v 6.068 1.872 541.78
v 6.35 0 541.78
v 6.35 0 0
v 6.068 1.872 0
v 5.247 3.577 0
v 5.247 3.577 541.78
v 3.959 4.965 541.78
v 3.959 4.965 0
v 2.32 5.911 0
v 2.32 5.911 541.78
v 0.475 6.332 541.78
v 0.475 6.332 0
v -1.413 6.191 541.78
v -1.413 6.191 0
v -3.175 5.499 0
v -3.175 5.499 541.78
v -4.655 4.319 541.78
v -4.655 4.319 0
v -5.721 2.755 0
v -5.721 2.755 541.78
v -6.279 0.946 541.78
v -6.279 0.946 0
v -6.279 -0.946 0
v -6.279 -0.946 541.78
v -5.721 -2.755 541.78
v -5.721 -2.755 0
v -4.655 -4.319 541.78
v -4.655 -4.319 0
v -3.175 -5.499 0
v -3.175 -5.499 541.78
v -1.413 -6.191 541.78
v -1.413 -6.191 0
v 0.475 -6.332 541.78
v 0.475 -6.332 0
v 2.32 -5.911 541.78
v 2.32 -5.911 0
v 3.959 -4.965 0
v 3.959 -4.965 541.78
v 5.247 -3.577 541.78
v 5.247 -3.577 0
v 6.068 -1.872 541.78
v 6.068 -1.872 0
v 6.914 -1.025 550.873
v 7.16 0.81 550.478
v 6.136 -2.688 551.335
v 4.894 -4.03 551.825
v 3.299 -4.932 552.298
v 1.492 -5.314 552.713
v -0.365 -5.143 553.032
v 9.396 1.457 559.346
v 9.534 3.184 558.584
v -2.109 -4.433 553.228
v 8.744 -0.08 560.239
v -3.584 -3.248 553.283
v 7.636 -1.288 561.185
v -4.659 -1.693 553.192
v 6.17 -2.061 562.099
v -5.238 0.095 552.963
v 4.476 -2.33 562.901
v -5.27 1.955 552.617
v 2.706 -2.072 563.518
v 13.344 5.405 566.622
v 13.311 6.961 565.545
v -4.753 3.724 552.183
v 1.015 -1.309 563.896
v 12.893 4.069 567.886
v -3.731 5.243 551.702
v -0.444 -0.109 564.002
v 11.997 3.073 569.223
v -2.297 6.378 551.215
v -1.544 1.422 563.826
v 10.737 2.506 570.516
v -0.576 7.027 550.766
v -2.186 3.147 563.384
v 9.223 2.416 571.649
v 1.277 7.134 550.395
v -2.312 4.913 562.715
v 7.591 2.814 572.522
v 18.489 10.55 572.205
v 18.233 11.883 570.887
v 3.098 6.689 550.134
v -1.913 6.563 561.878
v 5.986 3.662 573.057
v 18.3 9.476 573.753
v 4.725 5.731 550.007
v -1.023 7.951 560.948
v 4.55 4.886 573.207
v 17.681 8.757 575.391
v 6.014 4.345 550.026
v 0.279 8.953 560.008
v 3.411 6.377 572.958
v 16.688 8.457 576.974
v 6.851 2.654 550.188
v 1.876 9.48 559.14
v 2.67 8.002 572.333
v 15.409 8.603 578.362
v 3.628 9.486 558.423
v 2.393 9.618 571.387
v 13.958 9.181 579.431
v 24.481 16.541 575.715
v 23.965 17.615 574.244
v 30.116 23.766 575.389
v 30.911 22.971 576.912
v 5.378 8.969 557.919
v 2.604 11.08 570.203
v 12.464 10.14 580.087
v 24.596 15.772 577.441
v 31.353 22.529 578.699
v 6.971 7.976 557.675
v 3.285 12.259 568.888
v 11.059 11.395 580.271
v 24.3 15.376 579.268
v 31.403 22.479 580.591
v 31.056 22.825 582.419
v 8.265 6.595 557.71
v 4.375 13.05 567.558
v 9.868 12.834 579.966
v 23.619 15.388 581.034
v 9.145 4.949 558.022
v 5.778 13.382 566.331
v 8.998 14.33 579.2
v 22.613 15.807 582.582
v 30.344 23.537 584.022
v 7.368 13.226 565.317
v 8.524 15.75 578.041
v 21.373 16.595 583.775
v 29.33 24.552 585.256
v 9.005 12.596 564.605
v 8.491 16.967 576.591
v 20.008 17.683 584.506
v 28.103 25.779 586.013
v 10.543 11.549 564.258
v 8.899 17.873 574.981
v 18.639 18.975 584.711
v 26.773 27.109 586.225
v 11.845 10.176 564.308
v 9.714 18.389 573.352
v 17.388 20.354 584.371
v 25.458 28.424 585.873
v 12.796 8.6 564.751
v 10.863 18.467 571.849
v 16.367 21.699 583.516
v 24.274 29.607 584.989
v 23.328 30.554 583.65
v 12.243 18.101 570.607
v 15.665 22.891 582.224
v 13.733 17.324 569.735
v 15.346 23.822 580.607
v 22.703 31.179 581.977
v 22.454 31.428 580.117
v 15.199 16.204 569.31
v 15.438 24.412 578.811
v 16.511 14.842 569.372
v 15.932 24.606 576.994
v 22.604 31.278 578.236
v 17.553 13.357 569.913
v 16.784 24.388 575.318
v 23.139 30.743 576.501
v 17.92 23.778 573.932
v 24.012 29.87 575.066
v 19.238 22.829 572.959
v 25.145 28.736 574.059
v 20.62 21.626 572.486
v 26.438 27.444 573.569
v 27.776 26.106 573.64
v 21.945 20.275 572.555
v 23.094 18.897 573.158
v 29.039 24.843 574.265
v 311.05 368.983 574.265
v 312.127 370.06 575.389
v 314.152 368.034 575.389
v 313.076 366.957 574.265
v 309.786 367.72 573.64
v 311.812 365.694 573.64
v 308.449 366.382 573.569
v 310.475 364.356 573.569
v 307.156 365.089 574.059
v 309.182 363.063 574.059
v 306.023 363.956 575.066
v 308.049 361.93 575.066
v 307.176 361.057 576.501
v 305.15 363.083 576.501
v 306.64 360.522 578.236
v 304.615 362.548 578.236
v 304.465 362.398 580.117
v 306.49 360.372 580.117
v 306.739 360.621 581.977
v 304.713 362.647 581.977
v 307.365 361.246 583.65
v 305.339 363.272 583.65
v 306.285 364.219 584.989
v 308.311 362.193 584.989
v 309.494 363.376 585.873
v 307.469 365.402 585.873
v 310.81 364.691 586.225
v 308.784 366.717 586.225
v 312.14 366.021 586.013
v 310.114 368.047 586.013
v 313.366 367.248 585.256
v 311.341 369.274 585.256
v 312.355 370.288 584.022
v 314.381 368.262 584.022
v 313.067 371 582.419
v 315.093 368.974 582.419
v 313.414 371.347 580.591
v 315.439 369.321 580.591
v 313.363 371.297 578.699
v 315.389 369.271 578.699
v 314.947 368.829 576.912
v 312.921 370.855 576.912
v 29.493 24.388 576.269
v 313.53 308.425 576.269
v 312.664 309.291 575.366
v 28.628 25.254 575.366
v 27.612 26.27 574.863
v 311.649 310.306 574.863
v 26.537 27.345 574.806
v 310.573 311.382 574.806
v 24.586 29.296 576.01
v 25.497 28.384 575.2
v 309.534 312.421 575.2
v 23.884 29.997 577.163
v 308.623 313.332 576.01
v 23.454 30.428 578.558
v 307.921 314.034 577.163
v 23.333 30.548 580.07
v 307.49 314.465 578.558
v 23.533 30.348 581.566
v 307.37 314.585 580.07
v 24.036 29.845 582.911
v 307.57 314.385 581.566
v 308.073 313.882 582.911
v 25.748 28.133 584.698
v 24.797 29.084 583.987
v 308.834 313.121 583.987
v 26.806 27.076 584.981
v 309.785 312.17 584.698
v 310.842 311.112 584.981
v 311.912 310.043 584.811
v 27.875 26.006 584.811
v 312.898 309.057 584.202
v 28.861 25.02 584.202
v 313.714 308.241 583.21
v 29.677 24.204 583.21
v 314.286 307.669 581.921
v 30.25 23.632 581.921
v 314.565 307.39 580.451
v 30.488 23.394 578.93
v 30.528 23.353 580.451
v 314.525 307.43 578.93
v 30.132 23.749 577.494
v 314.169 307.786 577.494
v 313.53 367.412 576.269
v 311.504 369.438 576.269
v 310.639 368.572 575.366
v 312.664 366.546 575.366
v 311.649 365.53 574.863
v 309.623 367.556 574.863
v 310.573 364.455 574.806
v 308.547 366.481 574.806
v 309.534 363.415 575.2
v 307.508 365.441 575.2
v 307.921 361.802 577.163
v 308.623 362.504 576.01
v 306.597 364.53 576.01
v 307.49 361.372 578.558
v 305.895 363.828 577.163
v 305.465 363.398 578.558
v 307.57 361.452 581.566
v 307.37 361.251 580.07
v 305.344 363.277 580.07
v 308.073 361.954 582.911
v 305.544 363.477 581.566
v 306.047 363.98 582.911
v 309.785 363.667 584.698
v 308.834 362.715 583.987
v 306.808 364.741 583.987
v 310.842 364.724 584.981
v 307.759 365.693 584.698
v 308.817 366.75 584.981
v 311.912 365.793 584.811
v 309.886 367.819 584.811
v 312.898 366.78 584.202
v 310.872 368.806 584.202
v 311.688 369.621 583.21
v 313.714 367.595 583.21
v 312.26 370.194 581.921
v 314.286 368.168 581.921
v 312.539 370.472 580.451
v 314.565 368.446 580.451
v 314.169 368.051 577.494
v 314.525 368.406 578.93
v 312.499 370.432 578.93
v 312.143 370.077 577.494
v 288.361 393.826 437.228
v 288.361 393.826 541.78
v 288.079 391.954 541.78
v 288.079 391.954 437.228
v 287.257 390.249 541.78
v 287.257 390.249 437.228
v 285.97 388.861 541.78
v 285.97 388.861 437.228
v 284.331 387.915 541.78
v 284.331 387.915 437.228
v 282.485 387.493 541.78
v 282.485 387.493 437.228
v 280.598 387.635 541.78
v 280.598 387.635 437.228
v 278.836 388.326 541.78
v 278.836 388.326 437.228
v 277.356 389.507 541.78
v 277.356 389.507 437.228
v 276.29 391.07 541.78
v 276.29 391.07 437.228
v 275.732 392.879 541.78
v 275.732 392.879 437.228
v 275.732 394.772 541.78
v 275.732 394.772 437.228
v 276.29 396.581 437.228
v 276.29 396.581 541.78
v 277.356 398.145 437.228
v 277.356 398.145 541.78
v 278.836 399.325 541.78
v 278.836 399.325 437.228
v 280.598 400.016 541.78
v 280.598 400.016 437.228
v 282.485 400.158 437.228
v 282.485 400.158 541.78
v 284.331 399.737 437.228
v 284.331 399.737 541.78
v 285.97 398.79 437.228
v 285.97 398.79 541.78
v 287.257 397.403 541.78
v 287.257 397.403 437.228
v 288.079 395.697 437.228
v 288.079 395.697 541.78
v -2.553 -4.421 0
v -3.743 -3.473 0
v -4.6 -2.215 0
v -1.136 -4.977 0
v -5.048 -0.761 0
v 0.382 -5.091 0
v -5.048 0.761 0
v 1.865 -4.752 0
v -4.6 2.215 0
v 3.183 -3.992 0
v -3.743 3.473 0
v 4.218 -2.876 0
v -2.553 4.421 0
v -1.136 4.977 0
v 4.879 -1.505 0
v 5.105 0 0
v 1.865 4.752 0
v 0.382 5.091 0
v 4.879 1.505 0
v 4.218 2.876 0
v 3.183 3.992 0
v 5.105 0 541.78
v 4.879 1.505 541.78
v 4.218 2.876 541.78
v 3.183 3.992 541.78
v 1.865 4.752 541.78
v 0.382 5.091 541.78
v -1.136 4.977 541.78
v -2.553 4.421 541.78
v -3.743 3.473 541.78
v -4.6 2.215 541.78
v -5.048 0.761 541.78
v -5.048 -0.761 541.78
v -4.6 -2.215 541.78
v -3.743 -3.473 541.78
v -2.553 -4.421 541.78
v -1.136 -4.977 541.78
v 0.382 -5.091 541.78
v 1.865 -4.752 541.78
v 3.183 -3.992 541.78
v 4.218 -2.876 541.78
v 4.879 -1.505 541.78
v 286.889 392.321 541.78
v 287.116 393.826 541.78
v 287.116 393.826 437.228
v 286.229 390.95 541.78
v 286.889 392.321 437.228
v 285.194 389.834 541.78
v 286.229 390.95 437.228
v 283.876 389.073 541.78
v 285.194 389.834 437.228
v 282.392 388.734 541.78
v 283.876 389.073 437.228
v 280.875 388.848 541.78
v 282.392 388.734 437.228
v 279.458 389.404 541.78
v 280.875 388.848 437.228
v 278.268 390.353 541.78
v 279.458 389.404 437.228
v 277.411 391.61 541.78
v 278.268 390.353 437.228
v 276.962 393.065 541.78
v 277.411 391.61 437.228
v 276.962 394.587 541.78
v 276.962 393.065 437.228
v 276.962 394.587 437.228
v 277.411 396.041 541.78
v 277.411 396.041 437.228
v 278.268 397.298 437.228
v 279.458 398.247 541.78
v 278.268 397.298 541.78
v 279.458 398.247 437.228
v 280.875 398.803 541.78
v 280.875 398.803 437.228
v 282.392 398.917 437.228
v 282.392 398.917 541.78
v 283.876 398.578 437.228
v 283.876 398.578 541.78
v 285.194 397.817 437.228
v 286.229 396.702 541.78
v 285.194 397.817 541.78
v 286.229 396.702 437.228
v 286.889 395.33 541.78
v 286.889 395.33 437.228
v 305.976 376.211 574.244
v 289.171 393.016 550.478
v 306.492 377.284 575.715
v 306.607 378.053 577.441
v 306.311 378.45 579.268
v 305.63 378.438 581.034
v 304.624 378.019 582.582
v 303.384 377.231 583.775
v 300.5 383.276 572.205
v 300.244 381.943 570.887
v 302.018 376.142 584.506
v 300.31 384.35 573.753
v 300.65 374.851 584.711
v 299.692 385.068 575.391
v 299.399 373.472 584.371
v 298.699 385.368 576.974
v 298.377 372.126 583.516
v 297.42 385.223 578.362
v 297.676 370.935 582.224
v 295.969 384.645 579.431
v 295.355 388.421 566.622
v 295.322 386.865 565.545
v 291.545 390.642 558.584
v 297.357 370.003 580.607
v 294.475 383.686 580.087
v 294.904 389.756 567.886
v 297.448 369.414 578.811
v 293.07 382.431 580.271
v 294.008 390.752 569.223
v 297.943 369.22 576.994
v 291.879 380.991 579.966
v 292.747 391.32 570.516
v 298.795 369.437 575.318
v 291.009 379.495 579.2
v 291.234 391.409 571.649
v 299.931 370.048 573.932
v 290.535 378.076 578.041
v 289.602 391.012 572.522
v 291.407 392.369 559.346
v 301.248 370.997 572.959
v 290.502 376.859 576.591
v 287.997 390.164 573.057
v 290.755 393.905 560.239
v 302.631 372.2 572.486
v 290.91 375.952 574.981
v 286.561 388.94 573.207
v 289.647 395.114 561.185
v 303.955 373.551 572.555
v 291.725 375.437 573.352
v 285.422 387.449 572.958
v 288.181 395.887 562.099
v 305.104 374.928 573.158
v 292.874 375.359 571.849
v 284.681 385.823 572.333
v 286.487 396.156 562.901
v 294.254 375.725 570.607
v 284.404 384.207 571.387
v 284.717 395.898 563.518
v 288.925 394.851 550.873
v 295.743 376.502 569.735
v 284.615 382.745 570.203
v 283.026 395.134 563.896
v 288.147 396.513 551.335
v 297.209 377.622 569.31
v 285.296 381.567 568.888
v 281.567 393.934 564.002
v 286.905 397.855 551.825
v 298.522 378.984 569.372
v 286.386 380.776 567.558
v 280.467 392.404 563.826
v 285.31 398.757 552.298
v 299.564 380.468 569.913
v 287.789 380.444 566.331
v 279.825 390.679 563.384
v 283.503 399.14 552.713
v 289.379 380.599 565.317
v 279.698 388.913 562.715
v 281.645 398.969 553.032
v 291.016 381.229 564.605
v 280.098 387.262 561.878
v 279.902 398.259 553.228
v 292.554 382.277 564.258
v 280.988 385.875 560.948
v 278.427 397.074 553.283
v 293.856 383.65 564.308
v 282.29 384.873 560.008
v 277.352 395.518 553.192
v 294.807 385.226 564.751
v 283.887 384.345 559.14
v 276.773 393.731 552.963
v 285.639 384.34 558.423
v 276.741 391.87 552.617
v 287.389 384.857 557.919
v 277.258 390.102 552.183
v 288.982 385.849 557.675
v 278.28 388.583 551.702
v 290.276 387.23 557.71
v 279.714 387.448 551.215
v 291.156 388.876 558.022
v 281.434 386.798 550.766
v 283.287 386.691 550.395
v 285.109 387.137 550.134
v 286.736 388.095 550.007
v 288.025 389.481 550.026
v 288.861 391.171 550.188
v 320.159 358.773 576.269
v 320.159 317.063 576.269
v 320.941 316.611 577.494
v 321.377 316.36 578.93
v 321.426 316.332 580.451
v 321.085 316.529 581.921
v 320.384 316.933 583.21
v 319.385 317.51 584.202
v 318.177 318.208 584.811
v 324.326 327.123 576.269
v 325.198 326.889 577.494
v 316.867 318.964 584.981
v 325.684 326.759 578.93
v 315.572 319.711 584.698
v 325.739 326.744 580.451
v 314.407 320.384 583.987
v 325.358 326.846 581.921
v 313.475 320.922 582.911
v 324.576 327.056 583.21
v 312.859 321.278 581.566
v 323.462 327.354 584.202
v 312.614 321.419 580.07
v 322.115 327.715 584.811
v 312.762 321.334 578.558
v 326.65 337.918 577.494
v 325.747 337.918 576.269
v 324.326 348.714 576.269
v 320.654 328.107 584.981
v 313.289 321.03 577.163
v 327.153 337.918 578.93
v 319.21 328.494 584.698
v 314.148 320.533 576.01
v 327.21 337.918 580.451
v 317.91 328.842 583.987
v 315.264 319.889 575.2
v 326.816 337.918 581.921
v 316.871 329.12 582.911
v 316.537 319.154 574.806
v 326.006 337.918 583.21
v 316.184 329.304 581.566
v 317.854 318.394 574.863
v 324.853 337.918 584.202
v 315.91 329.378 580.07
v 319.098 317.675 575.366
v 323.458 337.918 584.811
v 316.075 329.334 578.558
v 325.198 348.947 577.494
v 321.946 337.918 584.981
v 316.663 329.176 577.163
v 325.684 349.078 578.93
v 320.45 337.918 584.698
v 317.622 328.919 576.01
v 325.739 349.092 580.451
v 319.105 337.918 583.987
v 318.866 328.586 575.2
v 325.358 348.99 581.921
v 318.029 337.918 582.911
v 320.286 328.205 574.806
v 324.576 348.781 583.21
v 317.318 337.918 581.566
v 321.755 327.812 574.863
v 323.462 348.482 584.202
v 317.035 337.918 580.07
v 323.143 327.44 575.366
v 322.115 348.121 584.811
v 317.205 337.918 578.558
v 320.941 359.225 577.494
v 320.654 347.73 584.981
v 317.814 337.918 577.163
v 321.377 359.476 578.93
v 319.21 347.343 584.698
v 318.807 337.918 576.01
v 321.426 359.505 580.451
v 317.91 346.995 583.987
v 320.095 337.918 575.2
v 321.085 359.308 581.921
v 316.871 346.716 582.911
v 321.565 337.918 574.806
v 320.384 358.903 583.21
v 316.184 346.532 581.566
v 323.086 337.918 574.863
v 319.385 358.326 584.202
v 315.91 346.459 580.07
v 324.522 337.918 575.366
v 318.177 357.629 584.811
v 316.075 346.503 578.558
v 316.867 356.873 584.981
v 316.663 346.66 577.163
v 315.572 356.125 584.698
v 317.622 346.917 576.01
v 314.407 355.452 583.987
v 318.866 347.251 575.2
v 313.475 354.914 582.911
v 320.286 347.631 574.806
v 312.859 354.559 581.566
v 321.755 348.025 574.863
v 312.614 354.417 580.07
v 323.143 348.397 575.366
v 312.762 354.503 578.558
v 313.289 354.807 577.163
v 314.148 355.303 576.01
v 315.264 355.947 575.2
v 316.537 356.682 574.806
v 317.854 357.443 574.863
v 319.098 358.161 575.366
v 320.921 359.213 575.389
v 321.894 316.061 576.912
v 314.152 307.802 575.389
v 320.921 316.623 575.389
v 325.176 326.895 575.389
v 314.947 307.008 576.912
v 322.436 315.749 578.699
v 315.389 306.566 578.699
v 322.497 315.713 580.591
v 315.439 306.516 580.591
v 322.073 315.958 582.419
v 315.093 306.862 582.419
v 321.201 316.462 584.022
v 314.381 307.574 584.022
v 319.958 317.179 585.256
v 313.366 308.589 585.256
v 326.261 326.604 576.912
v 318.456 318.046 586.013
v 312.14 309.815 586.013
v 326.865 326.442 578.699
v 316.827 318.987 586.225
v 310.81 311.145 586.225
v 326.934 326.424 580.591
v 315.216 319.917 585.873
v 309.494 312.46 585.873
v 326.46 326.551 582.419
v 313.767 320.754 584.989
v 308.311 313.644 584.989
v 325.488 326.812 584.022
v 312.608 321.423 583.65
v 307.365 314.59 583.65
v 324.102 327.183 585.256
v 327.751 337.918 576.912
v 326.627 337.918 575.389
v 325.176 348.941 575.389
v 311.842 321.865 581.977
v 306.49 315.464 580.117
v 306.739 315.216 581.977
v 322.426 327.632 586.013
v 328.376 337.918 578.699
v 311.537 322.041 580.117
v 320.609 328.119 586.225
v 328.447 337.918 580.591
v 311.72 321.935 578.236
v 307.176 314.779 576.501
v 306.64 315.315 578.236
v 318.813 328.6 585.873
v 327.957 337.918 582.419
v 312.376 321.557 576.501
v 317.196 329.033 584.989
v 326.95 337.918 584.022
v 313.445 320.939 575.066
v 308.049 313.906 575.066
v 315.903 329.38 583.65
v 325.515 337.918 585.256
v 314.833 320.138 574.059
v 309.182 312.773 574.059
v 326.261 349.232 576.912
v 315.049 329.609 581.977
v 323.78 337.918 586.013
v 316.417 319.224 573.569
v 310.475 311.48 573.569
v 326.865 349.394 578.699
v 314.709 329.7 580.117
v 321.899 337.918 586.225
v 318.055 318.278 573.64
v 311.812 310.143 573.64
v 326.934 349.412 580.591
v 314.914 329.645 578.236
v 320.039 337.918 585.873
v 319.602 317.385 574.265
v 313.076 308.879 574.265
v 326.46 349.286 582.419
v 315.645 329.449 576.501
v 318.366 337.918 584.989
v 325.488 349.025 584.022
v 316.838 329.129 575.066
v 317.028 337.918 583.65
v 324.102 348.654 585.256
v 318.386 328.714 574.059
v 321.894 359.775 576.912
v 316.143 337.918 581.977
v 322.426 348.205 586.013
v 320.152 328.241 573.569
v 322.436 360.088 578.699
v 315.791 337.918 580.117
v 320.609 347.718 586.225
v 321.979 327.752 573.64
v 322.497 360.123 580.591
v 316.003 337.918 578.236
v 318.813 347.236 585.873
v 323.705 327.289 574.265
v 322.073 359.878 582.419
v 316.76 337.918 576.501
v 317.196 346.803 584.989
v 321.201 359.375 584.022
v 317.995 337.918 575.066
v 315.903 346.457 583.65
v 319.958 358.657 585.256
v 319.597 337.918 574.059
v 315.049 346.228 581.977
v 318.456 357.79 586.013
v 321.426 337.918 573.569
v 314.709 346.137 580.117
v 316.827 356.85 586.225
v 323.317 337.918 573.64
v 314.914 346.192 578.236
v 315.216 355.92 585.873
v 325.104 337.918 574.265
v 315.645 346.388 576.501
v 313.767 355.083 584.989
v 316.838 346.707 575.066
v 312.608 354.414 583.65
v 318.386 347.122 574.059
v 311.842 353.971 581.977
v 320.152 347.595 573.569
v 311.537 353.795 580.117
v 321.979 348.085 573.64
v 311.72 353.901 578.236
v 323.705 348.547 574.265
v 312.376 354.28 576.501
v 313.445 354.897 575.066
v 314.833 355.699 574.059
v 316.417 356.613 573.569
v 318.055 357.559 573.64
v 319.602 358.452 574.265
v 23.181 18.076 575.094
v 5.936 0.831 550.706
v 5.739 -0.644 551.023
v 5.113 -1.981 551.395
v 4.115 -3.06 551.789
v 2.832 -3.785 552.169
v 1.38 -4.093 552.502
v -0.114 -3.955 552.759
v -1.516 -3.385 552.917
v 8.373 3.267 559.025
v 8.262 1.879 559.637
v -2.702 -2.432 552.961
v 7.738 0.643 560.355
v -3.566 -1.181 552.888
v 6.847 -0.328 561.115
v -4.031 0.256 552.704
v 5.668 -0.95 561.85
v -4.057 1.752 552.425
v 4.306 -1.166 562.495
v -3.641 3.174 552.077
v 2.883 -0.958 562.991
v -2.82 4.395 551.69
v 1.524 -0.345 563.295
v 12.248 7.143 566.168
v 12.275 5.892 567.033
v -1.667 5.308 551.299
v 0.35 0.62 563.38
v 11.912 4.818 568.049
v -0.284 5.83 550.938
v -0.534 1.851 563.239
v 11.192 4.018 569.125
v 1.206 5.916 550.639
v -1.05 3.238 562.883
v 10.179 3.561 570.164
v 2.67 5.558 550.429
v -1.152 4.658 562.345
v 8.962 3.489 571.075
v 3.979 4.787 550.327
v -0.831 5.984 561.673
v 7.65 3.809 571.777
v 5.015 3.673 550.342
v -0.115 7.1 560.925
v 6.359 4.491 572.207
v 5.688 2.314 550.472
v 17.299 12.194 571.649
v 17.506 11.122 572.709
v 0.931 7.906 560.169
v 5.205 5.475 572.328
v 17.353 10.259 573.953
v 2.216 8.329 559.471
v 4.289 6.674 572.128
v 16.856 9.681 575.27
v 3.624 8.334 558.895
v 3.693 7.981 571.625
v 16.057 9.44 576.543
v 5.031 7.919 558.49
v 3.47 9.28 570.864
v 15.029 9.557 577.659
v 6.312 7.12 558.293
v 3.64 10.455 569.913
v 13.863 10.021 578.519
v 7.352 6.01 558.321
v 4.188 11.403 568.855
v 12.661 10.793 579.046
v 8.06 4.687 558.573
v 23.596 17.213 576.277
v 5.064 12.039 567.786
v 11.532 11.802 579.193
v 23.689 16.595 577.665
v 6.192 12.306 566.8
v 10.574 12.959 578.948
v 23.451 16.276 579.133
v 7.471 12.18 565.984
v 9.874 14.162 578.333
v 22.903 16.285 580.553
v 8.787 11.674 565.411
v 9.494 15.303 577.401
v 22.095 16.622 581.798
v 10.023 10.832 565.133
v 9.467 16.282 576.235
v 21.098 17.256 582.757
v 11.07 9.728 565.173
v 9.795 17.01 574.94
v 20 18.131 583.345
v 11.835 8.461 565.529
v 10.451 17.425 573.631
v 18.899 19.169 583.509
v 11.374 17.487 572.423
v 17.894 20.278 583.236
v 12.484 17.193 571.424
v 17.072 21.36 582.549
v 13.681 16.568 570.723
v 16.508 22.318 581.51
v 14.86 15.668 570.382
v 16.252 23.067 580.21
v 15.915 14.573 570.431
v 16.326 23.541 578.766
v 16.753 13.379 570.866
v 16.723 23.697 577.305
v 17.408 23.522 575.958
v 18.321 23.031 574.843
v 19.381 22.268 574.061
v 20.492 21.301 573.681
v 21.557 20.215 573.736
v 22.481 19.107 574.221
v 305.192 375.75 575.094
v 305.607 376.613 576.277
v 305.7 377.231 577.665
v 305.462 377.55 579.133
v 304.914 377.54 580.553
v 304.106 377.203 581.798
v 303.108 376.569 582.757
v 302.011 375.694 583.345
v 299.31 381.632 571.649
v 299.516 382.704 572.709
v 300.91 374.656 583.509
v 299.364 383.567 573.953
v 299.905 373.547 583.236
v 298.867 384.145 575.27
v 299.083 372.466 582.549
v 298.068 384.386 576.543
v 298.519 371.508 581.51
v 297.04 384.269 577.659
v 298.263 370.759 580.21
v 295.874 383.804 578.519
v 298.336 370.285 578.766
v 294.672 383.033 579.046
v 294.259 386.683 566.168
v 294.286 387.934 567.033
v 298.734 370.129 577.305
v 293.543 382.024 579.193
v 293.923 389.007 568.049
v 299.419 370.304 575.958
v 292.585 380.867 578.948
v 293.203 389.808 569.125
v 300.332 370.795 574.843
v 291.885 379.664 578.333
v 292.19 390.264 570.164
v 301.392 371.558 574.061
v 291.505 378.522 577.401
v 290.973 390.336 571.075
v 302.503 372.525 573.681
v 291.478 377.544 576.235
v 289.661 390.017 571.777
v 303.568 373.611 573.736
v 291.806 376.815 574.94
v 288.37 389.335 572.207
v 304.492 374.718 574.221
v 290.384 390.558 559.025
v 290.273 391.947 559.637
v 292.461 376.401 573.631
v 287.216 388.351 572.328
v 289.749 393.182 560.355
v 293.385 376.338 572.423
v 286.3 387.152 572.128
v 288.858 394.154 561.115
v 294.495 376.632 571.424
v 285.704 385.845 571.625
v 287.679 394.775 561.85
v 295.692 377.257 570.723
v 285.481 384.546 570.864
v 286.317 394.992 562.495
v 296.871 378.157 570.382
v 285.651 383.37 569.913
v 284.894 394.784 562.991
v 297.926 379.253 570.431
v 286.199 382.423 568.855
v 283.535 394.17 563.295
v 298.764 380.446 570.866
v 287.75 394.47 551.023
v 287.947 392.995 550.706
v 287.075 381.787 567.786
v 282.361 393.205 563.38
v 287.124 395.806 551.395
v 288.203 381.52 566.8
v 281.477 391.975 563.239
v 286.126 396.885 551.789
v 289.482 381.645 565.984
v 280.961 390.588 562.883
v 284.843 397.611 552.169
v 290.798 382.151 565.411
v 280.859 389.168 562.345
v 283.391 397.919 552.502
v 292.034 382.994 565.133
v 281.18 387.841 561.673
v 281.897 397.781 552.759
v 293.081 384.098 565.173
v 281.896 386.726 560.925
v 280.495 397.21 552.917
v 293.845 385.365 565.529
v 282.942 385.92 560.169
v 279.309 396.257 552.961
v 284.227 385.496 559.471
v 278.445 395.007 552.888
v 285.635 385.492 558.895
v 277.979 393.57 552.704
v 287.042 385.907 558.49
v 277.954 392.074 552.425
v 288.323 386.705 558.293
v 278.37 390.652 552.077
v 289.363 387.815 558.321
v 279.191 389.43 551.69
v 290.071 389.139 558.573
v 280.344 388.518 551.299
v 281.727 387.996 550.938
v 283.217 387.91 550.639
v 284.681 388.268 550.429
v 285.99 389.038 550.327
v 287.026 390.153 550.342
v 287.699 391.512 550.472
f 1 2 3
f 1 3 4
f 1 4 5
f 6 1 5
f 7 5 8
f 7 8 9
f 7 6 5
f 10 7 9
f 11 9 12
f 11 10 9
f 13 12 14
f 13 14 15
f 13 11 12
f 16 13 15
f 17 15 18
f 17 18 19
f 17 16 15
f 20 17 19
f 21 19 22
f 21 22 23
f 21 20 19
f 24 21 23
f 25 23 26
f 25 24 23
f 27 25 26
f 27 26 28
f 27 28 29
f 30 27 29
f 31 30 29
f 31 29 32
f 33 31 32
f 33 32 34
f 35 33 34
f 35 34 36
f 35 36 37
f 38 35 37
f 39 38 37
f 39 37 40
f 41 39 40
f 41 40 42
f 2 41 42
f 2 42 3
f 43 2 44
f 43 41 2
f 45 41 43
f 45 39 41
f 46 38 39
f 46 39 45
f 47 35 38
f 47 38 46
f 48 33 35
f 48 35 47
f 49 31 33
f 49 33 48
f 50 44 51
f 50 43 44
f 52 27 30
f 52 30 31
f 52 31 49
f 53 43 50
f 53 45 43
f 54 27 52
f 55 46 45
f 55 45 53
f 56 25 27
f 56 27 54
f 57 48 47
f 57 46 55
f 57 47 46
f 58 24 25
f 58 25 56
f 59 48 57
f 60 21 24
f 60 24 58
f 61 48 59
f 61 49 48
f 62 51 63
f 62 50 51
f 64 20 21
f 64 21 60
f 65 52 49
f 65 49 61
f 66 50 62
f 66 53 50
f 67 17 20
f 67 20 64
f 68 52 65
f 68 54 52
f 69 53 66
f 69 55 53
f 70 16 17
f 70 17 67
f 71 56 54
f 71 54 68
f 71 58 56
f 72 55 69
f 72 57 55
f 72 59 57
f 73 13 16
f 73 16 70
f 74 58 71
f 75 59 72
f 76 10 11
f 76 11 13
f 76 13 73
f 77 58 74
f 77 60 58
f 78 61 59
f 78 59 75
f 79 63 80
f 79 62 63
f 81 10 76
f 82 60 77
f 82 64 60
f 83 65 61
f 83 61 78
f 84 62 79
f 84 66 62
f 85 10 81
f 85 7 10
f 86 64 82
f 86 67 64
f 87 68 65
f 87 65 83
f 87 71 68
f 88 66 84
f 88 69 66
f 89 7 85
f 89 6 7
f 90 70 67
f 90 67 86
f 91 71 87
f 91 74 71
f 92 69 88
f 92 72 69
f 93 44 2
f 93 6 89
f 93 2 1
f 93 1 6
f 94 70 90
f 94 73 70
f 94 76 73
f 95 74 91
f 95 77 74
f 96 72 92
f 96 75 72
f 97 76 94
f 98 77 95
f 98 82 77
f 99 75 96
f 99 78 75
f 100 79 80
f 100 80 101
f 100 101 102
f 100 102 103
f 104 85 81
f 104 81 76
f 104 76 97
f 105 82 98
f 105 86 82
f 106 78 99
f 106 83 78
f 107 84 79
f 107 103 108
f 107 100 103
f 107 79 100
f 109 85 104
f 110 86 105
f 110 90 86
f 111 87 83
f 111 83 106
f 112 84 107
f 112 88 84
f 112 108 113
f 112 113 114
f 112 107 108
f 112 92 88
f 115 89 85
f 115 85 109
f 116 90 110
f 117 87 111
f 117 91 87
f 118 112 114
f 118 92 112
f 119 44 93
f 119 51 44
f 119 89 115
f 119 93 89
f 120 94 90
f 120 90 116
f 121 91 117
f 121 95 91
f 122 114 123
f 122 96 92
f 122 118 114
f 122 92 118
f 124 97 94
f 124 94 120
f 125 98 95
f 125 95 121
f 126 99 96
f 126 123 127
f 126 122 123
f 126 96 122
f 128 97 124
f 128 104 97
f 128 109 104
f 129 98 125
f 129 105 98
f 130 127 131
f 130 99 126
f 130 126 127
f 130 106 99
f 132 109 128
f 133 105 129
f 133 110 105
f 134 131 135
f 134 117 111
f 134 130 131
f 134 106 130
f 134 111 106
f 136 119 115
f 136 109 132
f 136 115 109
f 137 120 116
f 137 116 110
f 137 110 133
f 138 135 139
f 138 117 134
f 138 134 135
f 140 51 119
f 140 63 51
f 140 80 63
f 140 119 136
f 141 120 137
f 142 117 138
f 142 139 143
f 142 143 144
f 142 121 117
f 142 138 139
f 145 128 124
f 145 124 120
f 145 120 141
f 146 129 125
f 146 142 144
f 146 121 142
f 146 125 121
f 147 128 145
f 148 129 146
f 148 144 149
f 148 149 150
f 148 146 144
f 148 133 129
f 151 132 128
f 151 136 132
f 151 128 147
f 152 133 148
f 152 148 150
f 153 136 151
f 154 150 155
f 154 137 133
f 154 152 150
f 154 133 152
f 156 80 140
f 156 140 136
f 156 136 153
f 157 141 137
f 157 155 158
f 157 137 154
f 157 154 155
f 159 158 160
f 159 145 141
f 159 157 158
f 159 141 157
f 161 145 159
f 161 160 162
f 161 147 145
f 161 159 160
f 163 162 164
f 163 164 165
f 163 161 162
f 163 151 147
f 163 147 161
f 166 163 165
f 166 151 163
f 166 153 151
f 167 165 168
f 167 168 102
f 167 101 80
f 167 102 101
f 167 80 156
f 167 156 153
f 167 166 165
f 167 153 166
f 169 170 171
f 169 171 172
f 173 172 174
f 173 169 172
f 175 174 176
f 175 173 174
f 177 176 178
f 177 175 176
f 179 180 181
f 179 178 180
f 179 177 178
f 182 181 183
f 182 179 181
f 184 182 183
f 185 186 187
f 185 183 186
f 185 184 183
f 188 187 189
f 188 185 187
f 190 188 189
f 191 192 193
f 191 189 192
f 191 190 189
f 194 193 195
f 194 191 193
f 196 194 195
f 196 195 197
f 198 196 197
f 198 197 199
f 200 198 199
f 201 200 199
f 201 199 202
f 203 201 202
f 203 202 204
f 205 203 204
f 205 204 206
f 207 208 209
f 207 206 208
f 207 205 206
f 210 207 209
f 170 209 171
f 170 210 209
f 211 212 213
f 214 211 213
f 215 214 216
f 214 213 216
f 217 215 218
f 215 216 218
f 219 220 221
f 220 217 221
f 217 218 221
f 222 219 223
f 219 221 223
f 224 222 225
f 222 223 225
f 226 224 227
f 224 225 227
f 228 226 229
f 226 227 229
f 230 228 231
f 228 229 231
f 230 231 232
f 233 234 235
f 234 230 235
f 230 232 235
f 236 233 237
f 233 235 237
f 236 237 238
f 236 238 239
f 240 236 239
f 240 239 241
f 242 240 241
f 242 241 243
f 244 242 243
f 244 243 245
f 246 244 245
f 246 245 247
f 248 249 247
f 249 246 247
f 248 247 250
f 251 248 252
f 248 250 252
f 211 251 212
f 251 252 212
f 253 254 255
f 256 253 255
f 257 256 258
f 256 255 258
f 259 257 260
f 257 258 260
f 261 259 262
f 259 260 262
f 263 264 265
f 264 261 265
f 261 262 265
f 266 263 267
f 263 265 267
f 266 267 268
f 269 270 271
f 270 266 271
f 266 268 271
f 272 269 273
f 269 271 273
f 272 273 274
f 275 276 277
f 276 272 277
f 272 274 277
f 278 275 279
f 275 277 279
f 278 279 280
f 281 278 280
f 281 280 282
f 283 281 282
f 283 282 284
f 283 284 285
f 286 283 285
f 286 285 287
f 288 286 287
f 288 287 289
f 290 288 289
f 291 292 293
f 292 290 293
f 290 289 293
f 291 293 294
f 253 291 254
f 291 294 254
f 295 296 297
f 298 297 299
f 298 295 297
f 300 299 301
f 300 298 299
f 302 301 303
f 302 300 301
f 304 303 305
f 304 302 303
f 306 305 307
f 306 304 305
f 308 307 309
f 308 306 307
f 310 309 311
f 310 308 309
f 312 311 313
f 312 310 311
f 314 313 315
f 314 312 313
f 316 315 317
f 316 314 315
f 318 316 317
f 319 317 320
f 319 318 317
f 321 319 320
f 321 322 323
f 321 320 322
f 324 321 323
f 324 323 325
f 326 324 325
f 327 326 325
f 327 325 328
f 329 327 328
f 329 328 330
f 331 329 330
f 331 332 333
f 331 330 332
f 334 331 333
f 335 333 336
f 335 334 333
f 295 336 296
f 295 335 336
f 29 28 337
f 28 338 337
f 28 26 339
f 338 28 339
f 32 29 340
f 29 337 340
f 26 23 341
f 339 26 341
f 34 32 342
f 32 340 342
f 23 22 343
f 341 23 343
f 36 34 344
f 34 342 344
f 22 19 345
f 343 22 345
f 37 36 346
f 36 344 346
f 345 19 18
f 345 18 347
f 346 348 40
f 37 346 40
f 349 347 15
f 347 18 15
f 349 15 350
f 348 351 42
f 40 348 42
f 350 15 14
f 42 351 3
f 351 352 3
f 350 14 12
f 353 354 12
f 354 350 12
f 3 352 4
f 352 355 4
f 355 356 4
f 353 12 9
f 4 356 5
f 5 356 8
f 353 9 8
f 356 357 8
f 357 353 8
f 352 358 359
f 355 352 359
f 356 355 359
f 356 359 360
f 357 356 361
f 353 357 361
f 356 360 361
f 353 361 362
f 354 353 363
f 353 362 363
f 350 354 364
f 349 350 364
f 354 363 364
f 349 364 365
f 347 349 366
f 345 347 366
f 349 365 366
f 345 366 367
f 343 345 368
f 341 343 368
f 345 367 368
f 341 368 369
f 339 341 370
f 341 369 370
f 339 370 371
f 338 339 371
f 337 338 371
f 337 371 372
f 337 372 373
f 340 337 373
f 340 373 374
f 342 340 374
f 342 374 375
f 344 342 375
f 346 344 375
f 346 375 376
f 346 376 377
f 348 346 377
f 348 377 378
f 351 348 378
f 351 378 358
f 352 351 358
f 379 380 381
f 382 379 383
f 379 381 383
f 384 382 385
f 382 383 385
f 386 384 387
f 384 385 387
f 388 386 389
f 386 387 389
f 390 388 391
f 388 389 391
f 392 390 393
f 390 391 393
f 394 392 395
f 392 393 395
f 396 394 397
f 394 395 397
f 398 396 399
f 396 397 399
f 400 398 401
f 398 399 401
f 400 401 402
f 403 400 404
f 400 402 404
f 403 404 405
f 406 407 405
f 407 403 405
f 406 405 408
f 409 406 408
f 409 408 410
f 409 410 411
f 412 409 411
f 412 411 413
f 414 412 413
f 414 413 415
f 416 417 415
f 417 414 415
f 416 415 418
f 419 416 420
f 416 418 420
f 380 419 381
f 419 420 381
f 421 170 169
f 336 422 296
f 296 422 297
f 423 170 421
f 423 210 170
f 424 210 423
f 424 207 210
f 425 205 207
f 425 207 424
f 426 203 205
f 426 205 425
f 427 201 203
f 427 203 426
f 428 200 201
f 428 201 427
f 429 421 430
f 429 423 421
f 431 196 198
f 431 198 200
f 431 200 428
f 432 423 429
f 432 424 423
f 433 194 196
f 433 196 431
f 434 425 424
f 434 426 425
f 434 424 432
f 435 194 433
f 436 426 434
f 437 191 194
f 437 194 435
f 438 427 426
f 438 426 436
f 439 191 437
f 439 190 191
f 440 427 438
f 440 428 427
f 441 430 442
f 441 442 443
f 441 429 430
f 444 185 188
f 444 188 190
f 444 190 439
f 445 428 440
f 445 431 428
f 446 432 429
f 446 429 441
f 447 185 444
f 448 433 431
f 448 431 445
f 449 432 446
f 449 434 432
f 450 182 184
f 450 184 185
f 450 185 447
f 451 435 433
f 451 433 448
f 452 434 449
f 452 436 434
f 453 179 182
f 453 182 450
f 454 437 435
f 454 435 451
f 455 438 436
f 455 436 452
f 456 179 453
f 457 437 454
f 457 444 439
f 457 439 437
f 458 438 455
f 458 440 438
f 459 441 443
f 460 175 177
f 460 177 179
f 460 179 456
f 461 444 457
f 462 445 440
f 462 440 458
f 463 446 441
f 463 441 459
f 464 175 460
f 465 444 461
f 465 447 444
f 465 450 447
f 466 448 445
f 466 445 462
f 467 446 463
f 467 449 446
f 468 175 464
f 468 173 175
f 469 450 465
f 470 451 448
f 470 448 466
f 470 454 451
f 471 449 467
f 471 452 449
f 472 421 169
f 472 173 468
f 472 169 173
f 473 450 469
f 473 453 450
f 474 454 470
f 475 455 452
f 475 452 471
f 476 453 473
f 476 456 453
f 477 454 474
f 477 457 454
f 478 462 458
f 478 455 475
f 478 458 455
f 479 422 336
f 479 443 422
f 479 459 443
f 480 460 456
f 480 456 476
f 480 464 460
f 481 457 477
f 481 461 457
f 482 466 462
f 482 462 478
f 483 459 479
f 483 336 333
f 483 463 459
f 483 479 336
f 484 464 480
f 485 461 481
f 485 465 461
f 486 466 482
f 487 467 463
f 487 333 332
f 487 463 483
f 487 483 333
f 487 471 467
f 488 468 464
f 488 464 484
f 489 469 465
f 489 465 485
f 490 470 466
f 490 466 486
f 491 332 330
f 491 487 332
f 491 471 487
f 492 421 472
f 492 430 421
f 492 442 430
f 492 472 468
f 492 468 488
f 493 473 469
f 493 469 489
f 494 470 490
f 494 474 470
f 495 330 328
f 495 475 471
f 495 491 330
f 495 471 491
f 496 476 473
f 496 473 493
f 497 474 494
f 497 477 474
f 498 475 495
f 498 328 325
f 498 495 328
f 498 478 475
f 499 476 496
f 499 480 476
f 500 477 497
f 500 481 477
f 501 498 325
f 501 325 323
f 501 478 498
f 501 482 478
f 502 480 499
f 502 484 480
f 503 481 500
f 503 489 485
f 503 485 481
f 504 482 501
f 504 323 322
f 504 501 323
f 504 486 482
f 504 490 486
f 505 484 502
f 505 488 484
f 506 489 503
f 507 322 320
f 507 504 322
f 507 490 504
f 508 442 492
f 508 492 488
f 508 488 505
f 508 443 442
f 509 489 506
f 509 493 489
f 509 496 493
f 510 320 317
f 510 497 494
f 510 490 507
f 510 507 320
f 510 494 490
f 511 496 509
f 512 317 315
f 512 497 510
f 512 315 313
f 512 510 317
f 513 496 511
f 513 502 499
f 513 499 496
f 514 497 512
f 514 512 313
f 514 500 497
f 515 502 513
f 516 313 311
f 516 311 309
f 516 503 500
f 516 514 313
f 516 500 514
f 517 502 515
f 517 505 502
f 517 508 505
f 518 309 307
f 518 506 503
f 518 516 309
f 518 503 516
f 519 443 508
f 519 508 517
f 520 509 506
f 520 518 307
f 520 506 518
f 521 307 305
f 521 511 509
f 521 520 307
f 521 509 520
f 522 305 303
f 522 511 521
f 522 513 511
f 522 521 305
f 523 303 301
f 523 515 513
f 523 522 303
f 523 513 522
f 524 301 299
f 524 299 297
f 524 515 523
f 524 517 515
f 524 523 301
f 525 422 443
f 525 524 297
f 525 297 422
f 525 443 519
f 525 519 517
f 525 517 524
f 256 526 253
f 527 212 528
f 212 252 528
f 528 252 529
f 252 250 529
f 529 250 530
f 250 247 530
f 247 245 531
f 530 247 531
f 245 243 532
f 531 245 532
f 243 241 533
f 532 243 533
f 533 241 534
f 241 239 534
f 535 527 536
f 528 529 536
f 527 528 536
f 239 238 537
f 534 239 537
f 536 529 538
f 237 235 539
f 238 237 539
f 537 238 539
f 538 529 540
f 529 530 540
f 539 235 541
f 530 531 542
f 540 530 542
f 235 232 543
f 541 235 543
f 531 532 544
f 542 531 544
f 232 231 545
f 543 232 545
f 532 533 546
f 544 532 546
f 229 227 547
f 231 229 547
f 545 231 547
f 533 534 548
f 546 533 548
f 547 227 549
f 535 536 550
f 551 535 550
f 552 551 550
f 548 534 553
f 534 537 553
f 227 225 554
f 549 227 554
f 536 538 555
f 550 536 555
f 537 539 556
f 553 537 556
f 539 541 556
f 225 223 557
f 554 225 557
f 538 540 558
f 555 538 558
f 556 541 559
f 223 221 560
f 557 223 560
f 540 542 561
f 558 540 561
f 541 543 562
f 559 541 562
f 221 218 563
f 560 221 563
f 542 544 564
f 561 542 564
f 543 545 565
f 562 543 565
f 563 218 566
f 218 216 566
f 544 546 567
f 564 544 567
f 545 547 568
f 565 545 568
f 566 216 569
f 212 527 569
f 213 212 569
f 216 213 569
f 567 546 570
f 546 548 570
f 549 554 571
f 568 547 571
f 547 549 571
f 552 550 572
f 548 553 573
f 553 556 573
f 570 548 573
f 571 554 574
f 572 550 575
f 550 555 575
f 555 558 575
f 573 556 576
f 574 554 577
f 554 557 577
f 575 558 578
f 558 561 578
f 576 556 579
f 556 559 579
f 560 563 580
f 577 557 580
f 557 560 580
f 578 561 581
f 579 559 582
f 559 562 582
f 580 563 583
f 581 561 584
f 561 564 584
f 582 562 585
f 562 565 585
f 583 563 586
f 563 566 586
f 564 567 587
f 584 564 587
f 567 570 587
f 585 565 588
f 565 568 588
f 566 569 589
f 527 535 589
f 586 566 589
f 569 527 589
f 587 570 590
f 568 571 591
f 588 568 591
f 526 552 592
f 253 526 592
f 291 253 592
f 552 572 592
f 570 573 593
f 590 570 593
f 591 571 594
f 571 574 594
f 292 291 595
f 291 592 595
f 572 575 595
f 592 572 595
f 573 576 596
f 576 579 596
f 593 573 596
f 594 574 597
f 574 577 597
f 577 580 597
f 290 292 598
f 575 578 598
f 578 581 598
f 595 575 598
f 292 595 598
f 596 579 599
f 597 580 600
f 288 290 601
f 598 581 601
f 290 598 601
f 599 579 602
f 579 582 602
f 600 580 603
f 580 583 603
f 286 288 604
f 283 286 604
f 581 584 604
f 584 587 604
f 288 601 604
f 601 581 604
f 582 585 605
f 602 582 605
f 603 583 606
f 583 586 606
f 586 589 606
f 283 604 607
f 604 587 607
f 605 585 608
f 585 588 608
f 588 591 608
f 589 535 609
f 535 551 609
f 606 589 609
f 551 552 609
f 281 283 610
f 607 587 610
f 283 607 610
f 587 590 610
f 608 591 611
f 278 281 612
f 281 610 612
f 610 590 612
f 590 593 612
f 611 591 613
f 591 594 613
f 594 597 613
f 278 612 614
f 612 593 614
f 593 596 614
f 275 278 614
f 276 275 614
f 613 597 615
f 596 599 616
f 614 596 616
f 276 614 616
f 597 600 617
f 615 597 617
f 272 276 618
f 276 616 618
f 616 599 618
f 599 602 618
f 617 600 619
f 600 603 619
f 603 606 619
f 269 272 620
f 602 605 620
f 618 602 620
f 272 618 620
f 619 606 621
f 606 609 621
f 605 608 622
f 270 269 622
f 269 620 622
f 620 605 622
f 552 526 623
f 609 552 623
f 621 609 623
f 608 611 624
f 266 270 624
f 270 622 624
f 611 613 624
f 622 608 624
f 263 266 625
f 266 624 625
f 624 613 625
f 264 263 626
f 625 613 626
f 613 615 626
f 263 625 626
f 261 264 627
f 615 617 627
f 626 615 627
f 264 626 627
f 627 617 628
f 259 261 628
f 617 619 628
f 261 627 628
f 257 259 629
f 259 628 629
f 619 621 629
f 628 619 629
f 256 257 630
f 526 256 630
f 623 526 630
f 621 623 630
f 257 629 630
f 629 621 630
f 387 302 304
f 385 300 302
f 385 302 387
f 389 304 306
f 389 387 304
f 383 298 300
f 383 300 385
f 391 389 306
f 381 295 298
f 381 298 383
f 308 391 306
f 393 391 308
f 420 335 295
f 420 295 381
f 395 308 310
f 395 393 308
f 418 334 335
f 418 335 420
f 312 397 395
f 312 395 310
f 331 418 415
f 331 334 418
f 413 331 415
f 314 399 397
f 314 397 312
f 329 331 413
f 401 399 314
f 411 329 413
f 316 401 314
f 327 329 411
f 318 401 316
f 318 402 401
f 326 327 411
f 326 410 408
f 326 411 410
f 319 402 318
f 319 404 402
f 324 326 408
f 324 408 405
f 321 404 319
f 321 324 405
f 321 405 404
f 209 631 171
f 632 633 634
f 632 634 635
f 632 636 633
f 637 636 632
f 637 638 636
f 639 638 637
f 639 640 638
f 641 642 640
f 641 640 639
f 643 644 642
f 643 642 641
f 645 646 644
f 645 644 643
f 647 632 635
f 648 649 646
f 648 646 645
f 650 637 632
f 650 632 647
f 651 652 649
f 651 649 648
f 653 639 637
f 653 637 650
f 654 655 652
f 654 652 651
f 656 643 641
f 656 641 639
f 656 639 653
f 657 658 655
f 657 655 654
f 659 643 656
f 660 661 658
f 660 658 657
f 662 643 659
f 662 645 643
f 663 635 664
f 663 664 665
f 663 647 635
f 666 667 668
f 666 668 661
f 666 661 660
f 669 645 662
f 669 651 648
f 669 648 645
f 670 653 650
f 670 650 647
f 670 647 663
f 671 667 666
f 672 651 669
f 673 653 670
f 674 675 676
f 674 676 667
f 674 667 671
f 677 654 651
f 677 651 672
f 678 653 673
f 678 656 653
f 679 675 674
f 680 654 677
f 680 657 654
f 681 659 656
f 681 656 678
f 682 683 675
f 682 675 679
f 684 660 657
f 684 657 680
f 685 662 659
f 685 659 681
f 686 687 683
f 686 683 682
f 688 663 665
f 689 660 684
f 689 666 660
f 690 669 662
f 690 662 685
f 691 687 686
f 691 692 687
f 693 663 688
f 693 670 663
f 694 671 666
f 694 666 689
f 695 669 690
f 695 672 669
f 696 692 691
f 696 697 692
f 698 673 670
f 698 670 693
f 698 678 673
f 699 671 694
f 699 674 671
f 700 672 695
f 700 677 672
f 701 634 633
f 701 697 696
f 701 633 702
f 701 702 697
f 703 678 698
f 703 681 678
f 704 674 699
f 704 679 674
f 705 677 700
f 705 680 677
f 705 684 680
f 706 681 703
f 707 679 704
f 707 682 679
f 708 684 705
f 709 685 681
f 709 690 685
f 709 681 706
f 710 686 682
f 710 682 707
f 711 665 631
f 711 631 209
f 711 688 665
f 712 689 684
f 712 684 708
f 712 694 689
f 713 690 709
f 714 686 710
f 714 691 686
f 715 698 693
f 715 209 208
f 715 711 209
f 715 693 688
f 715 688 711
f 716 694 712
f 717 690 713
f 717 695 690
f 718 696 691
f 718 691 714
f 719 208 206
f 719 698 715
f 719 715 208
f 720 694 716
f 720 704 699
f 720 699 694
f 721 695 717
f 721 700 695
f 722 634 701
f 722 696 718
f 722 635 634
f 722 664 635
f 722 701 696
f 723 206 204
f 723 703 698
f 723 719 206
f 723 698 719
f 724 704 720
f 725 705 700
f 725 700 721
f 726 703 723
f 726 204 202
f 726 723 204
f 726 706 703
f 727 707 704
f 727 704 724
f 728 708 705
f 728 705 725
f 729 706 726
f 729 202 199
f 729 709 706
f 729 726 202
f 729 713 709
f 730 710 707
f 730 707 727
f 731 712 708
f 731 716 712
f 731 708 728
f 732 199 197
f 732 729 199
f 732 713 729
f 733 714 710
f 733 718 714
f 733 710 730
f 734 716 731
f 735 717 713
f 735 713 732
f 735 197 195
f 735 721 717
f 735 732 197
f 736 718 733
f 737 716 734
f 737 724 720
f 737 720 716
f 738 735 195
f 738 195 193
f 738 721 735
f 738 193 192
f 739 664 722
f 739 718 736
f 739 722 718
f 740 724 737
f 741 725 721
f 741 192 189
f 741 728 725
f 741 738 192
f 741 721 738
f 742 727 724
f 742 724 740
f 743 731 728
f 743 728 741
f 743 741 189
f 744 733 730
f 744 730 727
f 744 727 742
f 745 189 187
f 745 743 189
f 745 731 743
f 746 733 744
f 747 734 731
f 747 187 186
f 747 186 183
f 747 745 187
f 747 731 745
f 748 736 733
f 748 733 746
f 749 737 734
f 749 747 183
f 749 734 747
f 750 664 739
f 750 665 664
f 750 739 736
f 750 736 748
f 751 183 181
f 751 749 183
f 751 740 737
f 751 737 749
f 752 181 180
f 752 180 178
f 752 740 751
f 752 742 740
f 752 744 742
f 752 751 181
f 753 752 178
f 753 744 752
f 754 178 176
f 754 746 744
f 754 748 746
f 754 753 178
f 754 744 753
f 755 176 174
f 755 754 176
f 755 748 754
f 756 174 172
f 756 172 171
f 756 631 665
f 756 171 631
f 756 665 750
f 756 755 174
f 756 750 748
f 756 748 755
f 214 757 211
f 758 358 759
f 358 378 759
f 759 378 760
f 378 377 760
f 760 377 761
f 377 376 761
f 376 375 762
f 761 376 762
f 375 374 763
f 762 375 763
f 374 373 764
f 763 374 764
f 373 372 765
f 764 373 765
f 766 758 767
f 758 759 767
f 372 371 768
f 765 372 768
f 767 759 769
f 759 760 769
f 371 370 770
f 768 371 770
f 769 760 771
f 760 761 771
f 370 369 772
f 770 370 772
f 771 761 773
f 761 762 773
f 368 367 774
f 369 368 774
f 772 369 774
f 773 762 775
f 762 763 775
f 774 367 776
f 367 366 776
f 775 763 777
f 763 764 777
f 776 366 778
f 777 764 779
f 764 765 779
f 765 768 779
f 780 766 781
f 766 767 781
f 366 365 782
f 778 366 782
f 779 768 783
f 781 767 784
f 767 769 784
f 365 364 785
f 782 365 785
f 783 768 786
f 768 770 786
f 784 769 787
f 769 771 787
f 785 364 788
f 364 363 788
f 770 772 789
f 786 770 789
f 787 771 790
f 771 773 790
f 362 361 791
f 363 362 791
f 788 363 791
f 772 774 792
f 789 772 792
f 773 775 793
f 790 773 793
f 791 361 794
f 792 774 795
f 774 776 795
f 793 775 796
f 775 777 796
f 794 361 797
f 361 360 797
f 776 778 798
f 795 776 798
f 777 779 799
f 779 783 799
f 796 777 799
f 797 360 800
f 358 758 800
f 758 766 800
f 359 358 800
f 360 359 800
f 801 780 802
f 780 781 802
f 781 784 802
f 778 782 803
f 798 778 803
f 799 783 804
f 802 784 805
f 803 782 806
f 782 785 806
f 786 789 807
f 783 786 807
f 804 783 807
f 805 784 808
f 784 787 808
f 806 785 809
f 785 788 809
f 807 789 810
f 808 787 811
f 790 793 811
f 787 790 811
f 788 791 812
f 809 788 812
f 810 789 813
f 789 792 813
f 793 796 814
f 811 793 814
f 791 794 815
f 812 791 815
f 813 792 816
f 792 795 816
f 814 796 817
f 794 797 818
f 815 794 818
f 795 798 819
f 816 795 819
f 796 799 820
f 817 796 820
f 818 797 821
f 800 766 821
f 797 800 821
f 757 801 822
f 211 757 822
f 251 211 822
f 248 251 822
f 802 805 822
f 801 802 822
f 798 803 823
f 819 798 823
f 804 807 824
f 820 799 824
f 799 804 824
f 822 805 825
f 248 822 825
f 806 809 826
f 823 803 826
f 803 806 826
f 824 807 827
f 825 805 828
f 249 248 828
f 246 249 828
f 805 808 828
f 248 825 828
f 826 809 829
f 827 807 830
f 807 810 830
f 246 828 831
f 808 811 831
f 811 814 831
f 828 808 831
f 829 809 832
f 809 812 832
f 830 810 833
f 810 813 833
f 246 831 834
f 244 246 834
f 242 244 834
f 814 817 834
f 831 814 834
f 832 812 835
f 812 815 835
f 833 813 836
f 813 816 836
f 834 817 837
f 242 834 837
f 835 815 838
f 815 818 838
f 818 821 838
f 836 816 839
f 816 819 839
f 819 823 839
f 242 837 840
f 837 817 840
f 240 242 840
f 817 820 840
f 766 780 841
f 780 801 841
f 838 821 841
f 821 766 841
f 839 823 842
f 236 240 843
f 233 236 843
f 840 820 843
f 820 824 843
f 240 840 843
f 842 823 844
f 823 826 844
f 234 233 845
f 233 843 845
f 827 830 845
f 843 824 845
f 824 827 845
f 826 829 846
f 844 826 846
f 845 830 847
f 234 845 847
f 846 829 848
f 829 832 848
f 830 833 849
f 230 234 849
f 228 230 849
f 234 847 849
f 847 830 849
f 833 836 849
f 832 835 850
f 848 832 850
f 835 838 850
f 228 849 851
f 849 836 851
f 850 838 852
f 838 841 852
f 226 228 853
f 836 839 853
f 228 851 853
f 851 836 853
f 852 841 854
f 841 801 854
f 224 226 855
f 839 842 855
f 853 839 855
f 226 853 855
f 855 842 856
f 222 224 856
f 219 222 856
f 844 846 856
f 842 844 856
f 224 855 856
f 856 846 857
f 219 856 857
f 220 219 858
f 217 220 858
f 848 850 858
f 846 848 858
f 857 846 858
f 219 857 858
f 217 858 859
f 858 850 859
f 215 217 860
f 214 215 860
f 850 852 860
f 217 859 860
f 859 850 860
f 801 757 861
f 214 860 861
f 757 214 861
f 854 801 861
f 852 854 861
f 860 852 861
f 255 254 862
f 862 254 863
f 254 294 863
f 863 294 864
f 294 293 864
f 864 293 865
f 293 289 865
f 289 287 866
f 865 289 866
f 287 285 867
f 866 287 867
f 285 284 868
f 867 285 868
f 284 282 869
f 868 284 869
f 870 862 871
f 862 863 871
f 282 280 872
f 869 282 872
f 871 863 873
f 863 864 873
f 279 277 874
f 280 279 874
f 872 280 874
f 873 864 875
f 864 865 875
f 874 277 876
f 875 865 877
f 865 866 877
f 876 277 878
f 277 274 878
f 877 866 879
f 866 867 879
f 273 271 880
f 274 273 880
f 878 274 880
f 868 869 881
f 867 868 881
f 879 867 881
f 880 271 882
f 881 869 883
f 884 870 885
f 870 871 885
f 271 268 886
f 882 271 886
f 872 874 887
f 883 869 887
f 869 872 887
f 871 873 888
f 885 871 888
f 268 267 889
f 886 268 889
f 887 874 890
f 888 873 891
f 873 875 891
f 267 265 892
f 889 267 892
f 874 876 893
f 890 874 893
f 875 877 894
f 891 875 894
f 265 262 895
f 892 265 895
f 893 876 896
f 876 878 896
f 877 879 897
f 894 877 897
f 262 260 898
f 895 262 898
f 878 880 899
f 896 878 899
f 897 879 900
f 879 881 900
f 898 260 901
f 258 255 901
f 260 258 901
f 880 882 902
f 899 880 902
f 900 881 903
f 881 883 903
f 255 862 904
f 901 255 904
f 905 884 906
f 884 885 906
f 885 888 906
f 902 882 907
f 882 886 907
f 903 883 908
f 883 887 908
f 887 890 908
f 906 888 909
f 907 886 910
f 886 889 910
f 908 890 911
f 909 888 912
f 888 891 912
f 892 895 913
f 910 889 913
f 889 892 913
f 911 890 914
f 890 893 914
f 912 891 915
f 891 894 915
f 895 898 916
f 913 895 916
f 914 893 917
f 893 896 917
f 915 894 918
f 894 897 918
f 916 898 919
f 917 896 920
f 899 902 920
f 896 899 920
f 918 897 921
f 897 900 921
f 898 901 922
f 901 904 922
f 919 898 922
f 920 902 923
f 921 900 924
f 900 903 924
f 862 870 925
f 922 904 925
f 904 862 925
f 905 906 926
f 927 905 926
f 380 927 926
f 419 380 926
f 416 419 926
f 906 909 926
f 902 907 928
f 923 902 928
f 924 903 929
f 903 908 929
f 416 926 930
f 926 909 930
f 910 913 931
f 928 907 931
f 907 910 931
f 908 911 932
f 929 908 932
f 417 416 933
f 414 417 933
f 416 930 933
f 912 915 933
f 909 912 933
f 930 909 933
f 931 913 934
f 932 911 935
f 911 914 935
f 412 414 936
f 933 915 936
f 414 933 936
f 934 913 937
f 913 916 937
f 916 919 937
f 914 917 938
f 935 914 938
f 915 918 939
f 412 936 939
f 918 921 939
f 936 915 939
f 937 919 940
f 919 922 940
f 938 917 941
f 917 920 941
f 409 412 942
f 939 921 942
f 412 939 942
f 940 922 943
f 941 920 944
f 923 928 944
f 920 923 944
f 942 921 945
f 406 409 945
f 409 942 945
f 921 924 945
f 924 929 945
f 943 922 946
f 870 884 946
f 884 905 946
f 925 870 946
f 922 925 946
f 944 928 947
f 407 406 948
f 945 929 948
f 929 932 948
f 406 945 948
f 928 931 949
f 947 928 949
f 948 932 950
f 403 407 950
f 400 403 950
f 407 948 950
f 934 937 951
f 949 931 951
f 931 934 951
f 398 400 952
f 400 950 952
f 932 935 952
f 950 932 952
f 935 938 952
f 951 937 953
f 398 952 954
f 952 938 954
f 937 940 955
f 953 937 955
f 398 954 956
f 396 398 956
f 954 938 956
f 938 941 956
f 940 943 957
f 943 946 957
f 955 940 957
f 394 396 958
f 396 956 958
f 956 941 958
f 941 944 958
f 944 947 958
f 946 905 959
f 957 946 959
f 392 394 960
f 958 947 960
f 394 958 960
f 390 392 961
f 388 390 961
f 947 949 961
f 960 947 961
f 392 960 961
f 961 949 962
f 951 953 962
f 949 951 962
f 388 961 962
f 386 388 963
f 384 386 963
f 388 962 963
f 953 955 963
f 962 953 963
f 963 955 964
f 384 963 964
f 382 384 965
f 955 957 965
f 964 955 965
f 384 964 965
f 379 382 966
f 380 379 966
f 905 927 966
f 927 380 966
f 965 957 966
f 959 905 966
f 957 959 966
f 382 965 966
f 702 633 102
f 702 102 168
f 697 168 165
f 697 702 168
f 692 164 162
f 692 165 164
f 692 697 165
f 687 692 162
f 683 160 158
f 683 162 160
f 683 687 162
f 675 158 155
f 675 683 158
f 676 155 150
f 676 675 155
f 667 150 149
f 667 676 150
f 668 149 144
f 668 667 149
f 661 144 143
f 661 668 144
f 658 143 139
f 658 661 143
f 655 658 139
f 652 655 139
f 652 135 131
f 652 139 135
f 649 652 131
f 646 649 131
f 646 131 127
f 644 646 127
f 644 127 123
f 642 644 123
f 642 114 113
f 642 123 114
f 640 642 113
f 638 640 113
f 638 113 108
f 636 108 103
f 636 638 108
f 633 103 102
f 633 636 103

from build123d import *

# Parameters (mm, degrees)
PIPESKETCH_R   = 6.35
PIPESKETCH_R_2 = 5.1054


with BuildPart() as part:
    # ThinSweep: sweep along a curve in space
    with BuildLine() as thinsweep_path:
        Line((0, 0, 0), (0, 0, 541.779553996))
        ThreePointArc((0, 0, 541.779553996), (7.890768363, 7.890768363, 568.72032236), (26.940768363, 26.940768363, 579.879553996))
        Line((26.940768363, 26.940768363, 579.879553996), (310.977472549, 310.977472549, 579.879553996))
        ThreePointArc((310.977472549, 310.977472549, 579.879553996), (322.136704186, 337.918240913, 579.879553996), (310.977472549, 364.859009276, 579.879553996))
        Line((310.977472549, 364.859009276, 579.879553996), (308.951639669, 366.884842156, 579.879553996))
        ThreePointArc((308.951639669, 366.884842156, 579.879553996), (289.901639669, 385.934842156, 568.72032236), (282.010871306, 393.825610519, 541.779553996))
        Line((282.010871306, 393.825610519, 437.228053913), (282.010871306, 393.825610519, 541.779553996))
    # PipeSketch → ThinSweep (sweep)
    with BuildSketch(Plane.XY):
        Circle(PIPESKETCH_R)
        Circle(PIPESKETCH_R_2, mode=Mode.SUBTRACT)
    sweep(path=thinsweep_path.line)


solid = part.part
